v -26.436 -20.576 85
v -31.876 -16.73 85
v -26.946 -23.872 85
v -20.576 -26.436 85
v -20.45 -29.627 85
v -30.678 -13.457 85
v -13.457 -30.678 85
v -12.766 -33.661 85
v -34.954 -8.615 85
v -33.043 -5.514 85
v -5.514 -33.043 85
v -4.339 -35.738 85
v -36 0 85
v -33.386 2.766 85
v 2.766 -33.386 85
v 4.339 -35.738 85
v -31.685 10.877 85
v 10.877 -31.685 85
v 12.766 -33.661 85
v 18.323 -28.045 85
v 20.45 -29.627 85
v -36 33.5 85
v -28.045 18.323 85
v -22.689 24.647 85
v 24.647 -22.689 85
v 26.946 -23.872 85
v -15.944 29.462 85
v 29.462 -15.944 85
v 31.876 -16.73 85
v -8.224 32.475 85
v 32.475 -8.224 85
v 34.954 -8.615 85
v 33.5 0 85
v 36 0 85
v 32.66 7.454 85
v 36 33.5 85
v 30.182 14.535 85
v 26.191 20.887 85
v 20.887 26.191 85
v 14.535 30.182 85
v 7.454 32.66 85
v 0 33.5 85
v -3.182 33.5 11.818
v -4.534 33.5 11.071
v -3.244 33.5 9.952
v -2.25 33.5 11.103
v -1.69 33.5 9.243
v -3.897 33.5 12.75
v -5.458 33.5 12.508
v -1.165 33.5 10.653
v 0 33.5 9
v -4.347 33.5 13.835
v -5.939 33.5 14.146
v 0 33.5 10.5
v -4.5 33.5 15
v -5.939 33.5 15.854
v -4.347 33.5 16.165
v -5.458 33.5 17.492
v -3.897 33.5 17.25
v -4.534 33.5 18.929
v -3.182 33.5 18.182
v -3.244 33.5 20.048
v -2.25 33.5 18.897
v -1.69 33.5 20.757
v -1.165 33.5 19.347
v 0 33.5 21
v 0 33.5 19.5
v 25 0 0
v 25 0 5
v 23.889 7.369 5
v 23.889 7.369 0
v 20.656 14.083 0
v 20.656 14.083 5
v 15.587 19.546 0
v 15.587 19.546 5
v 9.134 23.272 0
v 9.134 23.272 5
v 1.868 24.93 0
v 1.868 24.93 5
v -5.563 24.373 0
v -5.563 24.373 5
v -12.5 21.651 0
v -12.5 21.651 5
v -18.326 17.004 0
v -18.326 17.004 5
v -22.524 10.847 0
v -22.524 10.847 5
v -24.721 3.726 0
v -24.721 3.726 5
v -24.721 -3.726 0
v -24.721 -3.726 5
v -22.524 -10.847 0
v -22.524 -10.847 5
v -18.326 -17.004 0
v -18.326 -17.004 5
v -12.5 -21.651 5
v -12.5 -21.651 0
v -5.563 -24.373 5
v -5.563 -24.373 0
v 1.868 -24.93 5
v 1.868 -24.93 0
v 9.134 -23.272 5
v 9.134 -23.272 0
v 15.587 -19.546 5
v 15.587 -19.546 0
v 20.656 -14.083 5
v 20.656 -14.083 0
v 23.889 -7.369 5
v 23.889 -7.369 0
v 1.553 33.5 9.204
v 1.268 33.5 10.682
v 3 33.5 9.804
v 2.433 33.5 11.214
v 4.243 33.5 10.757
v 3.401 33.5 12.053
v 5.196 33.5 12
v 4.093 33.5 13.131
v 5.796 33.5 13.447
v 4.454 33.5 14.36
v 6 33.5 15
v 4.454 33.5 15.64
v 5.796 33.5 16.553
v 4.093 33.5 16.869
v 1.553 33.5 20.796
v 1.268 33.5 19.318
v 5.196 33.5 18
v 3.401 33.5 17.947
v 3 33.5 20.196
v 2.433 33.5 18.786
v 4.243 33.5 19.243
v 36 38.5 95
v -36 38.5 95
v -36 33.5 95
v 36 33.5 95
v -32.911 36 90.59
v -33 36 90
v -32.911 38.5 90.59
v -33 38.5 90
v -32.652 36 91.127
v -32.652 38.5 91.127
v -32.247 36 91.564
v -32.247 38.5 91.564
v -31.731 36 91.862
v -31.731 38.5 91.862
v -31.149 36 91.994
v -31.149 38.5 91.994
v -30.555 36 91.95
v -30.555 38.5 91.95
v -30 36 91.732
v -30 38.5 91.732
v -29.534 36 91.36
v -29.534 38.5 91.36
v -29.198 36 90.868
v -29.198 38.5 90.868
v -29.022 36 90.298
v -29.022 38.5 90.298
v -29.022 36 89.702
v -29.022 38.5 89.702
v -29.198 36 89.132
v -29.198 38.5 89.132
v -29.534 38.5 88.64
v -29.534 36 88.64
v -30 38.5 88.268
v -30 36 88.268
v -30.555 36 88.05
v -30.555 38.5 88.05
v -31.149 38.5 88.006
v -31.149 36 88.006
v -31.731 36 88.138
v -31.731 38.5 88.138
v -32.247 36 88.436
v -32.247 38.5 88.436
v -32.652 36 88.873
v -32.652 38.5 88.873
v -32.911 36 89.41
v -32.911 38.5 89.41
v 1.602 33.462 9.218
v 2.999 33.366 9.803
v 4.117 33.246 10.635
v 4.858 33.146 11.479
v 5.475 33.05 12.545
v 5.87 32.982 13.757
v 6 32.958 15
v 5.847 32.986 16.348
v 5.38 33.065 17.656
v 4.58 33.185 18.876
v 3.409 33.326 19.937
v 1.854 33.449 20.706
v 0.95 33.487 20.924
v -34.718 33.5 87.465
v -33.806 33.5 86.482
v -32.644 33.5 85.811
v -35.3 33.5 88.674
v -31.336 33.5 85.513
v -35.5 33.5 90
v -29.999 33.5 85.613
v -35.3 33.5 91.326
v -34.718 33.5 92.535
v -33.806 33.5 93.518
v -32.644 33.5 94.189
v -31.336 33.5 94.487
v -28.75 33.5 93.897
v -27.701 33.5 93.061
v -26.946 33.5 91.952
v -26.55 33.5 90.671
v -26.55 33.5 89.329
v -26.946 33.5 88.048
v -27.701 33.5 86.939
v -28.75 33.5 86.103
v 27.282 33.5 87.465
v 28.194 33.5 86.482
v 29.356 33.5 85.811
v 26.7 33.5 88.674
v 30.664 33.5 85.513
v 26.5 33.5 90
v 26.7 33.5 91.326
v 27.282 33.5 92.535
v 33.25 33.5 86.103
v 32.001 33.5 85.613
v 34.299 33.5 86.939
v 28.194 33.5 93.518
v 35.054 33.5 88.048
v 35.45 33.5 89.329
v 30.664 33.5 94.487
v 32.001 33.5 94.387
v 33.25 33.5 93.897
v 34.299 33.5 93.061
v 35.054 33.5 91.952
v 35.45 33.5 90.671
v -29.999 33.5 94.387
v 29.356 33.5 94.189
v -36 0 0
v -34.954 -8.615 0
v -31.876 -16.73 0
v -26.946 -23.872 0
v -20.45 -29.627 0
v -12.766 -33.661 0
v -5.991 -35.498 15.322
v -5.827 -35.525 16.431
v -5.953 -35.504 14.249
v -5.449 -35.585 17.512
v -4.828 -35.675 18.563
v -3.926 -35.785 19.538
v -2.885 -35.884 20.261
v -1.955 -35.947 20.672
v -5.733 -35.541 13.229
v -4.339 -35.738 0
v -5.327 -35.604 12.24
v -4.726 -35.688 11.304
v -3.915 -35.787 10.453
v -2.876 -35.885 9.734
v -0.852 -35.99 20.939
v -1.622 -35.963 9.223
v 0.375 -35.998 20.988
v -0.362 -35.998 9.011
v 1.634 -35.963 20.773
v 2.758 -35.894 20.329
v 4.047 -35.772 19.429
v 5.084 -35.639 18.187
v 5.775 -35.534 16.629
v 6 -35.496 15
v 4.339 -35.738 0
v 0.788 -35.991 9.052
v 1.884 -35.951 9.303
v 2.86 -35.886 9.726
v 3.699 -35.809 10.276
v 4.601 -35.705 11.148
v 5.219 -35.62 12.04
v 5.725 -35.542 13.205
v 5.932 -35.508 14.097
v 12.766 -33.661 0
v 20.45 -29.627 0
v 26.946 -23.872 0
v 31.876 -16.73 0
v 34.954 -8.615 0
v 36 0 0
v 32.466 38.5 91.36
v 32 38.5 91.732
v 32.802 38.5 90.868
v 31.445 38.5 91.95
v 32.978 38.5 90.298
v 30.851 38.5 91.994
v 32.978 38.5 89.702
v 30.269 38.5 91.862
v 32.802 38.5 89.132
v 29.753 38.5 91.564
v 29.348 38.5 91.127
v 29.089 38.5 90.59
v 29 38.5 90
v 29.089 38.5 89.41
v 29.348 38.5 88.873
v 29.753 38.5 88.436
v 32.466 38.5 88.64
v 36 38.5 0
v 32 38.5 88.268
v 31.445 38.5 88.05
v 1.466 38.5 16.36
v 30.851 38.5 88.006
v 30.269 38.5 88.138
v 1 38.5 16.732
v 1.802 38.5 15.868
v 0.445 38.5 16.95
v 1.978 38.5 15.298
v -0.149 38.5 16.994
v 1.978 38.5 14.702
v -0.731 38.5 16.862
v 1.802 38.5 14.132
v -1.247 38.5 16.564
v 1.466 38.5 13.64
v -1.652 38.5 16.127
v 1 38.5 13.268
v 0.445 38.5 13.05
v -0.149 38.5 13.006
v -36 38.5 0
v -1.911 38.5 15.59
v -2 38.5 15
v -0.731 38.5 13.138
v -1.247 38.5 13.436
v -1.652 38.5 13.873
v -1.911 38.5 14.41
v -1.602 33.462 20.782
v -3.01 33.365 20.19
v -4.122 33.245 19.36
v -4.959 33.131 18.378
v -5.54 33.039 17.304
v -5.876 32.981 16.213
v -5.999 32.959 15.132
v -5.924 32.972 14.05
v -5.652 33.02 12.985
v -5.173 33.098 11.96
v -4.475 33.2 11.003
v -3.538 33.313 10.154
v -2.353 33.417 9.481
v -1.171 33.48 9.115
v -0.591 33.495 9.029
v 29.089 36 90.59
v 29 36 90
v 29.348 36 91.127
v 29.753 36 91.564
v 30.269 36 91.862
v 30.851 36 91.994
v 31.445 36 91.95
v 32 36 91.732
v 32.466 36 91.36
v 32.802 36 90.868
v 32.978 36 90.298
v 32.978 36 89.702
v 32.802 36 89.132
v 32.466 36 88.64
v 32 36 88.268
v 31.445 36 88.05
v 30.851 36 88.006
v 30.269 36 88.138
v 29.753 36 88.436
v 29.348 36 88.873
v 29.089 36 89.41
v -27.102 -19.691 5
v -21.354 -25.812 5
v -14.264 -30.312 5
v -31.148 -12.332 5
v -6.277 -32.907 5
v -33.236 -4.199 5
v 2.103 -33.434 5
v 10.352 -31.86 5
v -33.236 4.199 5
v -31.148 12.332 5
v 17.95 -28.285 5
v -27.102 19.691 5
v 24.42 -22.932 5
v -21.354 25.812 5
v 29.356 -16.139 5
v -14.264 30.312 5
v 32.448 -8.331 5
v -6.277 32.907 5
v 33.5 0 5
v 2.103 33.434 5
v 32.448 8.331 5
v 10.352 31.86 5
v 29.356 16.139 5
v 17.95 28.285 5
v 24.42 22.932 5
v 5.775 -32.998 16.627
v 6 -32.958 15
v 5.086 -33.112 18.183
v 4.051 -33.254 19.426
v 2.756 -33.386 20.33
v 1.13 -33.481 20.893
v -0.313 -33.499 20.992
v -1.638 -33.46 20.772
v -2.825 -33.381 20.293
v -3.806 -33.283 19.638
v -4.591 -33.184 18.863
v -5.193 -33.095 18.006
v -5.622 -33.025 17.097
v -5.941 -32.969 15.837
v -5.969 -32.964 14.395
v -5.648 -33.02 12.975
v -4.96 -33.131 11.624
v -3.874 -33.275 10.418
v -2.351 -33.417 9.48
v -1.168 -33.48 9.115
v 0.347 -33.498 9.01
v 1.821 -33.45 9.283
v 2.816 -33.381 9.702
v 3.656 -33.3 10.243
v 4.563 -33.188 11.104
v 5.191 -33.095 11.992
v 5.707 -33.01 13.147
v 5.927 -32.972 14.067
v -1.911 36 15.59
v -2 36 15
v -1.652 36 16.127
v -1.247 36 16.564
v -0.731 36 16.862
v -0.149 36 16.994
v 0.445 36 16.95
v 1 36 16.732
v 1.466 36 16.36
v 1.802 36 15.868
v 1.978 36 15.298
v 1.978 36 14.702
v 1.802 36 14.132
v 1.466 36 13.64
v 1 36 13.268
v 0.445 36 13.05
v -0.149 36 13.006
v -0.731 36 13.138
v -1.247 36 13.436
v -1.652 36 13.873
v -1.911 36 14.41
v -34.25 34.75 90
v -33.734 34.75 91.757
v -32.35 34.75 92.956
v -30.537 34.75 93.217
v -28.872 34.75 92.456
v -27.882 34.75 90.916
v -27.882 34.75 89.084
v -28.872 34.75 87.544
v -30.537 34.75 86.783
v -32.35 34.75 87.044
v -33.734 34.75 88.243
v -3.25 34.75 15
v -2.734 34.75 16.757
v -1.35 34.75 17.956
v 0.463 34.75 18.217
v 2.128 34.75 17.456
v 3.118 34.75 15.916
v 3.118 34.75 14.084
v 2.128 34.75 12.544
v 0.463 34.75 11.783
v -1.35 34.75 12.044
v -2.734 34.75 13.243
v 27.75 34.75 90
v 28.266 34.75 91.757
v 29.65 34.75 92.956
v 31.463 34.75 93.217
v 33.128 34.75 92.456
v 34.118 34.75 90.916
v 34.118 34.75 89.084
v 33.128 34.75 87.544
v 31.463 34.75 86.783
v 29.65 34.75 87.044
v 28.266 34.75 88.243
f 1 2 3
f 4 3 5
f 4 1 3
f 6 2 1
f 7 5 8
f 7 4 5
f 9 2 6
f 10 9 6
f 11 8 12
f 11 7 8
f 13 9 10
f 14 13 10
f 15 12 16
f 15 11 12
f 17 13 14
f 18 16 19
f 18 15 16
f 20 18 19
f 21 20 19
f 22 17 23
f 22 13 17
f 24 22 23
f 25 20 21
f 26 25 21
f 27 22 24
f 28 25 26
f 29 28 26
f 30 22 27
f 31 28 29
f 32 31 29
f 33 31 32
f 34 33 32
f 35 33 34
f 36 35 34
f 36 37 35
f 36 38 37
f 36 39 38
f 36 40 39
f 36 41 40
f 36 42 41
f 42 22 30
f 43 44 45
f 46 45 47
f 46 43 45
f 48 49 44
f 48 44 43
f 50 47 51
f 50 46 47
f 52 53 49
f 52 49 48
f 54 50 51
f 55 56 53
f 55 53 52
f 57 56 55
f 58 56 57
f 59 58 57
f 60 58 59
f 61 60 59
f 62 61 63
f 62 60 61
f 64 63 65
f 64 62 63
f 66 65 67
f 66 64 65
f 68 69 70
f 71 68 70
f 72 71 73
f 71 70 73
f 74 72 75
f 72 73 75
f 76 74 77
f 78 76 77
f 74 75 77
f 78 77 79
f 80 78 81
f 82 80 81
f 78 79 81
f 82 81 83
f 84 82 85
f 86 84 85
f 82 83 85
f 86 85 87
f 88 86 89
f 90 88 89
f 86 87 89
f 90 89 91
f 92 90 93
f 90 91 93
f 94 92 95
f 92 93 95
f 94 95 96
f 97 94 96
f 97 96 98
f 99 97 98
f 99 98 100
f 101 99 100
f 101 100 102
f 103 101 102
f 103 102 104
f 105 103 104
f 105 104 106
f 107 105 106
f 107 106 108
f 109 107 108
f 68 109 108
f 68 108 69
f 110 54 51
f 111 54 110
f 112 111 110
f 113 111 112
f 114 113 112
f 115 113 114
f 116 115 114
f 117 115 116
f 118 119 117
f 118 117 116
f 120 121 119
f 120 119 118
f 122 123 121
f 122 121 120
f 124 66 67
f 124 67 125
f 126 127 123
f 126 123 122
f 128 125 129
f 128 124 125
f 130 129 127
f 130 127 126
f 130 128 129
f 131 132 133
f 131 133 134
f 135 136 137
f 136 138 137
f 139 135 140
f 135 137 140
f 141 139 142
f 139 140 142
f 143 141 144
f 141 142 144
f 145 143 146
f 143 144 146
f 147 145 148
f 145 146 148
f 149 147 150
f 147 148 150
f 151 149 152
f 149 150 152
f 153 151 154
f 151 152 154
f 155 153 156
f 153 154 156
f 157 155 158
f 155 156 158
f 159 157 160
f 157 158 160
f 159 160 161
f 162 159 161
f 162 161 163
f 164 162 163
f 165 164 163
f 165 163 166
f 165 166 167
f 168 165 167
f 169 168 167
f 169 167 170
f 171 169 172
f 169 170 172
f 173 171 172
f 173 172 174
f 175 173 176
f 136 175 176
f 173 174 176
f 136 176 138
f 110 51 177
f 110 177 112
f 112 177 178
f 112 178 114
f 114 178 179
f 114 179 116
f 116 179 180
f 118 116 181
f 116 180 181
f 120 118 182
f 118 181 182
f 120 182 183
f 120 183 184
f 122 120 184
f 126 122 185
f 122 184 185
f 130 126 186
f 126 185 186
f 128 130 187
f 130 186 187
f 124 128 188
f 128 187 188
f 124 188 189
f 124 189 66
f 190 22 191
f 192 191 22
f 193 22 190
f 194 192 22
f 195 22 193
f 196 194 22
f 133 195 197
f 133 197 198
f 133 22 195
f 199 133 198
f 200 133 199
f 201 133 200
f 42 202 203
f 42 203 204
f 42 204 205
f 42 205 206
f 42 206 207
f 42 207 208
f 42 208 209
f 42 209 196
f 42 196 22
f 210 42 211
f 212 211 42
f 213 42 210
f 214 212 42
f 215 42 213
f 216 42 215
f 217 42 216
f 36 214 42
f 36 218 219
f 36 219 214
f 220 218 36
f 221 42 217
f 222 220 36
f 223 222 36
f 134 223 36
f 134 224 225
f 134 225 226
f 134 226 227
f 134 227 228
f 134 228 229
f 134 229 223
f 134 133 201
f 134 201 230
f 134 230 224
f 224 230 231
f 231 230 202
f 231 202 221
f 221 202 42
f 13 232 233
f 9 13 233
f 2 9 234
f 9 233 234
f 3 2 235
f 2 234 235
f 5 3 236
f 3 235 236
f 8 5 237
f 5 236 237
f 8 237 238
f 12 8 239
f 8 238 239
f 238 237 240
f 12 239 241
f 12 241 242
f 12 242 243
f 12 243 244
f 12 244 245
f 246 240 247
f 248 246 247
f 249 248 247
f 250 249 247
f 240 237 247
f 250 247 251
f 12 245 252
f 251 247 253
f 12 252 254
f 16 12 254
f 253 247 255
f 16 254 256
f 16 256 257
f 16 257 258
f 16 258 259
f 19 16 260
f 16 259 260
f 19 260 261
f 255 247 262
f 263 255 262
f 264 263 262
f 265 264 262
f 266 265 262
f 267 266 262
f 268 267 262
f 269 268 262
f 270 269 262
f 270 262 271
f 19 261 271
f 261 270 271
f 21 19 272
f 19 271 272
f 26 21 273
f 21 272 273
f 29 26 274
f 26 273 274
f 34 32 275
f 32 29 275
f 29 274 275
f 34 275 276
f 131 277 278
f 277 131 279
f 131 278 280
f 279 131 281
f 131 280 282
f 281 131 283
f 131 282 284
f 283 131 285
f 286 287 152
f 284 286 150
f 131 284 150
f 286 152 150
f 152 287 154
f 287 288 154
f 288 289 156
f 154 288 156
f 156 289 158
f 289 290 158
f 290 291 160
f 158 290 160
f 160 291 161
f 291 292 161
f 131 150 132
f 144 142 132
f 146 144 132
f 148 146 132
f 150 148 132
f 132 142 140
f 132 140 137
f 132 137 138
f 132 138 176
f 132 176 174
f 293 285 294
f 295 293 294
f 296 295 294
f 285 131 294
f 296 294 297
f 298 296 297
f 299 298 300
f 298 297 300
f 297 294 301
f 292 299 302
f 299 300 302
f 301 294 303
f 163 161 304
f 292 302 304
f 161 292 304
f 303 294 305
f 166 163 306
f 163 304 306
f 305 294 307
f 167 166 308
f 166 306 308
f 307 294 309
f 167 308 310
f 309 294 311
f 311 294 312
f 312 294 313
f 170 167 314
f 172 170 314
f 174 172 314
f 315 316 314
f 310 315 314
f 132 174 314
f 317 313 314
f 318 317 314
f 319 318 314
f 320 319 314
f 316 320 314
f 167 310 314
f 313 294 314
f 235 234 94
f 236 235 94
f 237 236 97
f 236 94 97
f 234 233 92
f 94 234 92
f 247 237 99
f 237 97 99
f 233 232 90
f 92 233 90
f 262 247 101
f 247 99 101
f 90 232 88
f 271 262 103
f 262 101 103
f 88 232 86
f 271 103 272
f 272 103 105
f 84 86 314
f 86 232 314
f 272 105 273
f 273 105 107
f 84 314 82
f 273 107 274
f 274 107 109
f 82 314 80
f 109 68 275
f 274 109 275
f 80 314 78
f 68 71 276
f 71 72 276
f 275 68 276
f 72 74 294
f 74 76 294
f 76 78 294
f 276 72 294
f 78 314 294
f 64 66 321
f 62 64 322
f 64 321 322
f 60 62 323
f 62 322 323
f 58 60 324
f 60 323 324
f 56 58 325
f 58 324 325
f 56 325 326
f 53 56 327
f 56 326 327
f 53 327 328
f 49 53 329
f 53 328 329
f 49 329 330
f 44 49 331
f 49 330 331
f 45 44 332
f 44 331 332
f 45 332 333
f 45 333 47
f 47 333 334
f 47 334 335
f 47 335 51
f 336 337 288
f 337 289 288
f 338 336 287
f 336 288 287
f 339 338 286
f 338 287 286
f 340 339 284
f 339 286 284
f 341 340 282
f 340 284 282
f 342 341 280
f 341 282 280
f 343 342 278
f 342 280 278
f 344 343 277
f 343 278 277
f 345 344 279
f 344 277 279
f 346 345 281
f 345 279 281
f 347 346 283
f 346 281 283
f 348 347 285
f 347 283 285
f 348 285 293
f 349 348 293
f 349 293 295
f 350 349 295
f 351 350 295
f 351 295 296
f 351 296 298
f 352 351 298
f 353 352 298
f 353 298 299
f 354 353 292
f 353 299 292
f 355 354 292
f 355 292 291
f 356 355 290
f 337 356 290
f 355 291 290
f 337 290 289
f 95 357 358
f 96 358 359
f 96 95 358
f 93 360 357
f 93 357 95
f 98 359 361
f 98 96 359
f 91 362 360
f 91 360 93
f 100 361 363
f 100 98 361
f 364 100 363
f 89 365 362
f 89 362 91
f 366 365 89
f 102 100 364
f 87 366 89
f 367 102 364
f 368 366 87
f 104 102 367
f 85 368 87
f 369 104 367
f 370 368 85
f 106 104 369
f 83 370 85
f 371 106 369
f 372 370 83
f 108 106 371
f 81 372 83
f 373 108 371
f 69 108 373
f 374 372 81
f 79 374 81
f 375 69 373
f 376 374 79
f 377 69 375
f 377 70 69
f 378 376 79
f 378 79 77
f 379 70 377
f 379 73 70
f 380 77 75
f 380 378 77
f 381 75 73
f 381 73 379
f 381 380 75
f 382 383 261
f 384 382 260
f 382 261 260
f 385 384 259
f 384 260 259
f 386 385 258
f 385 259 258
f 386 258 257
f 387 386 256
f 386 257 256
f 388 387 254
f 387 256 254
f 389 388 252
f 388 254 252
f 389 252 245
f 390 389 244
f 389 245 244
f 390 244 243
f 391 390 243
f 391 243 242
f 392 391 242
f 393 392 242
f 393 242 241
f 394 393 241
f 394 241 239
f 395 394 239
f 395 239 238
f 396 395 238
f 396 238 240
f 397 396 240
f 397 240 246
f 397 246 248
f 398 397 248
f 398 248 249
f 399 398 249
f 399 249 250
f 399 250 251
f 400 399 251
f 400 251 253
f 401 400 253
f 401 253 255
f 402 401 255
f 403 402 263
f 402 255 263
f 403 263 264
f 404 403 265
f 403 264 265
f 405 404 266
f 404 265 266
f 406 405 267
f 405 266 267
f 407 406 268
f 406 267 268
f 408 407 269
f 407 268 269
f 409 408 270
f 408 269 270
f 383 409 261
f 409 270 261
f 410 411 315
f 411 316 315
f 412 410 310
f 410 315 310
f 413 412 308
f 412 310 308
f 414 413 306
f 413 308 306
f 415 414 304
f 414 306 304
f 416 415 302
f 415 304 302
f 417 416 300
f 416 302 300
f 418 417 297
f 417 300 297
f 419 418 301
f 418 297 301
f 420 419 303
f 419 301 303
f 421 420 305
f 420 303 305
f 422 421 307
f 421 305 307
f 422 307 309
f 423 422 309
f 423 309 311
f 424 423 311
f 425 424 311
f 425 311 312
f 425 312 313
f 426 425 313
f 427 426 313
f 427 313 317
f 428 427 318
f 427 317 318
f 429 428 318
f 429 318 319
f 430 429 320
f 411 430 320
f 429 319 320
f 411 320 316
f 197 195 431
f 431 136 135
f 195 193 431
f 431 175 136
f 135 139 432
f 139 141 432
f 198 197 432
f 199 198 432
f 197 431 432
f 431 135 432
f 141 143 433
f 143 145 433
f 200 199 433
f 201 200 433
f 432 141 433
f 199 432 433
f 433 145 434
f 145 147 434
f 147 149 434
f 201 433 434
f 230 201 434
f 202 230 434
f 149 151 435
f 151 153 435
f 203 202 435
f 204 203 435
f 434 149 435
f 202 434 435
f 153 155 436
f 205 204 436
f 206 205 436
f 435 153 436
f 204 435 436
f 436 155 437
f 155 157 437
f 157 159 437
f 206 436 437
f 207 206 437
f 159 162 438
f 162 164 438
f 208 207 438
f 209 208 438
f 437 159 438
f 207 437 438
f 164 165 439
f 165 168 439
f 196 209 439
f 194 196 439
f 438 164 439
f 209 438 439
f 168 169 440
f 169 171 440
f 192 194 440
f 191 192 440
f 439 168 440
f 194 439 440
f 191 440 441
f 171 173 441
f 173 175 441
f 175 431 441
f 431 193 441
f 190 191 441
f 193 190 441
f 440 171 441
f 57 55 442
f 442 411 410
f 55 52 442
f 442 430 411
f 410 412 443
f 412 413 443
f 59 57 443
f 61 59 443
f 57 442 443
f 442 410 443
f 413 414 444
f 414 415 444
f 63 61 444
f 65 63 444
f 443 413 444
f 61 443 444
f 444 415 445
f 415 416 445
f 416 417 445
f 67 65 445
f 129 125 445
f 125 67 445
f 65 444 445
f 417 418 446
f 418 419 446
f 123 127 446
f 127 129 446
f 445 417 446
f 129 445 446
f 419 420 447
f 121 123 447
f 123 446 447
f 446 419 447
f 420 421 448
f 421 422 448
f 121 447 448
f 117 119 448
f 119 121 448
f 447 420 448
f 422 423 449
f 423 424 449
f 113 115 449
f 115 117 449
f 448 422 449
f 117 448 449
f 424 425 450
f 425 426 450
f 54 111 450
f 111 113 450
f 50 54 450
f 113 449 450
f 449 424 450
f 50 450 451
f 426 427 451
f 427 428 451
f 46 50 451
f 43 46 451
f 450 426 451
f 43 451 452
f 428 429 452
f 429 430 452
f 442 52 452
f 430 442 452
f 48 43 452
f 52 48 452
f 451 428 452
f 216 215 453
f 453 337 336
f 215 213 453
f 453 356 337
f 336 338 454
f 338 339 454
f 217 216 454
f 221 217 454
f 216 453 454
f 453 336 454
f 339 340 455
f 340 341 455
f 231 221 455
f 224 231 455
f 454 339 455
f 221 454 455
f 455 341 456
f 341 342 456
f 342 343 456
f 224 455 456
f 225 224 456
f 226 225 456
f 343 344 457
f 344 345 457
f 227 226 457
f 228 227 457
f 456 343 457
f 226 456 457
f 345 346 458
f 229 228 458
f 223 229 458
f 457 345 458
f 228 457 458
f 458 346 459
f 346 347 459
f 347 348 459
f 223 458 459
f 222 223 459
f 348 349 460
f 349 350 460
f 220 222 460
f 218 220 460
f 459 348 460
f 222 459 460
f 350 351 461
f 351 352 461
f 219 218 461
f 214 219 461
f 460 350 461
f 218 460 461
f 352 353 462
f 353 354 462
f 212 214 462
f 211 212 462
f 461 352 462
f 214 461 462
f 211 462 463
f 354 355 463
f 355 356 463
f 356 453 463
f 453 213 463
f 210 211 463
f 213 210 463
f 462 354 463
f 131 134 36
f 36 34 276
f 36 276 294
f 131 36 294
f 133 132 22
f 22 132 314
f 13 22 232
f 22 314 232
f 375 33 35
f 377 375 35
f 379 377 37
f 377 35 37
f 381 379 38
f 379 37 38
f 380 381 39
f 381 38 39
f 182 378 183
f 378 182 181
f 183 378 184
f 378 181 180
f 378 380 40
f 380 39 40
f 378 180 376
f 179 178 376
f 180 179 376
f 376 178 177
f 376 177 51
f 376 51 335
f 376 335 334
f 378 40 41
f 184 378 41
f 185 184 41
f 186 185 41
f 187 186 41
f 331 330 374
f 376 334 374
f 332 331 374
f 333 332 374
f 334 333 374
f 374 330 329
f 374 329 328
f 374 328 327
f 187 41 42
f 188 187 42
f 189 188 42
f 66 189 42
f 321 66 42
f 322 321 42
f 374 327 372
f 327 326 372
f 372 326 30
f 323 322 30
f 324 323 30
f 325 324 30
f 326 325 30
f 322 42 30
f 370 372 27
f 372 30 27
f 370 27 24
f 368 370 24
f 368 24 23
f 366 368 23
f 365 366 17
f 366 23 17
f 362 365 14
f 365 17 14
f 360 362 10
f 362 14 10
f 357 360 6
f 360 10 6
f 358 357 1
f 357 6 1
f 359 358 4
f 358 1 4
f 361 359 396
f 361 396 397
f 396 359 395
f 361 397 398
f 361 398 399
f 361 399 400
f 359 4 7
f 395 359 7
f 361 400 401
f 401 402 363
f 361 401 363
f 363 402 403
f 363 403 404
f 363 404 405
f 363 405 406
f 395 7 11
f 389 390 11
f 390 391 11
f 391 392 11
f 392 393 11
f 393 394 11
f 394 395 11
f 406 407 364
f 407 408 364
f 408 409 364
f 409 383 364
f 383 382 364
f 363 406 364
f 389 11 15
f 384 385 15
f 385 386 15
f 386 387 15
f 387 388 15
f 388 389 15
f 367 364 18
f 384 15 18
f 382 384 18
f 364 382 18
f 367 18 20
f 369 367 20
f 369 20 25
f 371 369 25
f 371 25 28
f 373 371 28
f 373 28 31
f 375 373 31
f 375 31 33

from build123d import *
from build123d import SkipClean  # not in build123d's __all__

# Parameters (mm, degrees)
F1_DEPTH        = 95
F2_W            = 72
F2_H            = 80
F3_DEPTH        = 10
F4_R            = 33.5
F5_DEPTH        = 80
F7_D            = 4
F7_CSINK_D      = 9
F7_CSINK_ANGLE  = 90
F7_COPIES_COUNT = 2
F7_COPIES_PITCH = 81.154174
F8_R            = 25
F9_DEPTH        = 5.001
F11_R           = 6
F12_DEPTH       = 73.5


# Not quite as in the source:
# - a feature of the source that left no trace in its solid (it failed there, or was rolled back) is left out
# - a pattern or mirror of a feature is missing from the dataset's text; its kind, count and spacing are read off the source's solid


with BuildPart() as f1:
    # F0 (on Top) → F1 (new body)
    with BuildSketch(Plane.XY):
        with BuildLine():
            Line((36, 38.5), (-36, 38.5))
            Line((-36, 38.5), (-36, 0))
            ThreePointArc((-36, 0), (0, -36), (36, 0))
            Line((36, 0), (36, 38.5))
        make_face()
    extrude(amount=F1_DEPTH)

    # F2 (on face) → F3 (cut)
    with BuildSketch(Plane.XY.offset(95)):
        with Locations((0, -6.5)):
            Rectangle(F2_W, F2_H)
    extrude(amount=-F3_DEPTH, mode=Mode.SUBTRACT)

    # F4 (on face) → F5 (cut)
    with BuildSketch(Plane.XY.offset(85)):
        Circle(F4_R)
    extrude(amount=-F5_DEPTH, mode=Mode.SUBTRACT)

    # F7 (through all)
    with Locations(Plane.XZ.offset(-33.5)):
        with Locations((-31, 90), (31, 90)):
            f7 = CounterSinkHole(F7_D / 2, F7_CSINK_D / 2, counter_sink_angle=F7_CSINK_ANGLE)

    # F7_copies: F7 ×2
    with Locations(*[Vector(-0.3819889769, 0, -0.9241668797) * (i * F7_COPIES_PITCH) for i in range(1, F7_COPIES_COUNT)]):
        add(f7, clean=False, mode=Mode.SUBTRACT)

    # F8 (on face) → F9 (cut, through all)
    with BuildSketch(Plane.XY.offset(5)):
        Circle(F8_R)
    extrude(amount=-F9_DEPTH, mode=Mode.SUBTRACT)

    # F11 (on offset) → F12 (cut)
    with BuildSketch(Plane.XZ.offset(40)):
        with Locations((0, 15)):
            Circle(F11_R)
    with SkipClean():  # cleaning this boolean's faces spoils the solid; the shape is the same uncleaned
        extrude(amount=-F12_DEPTH, mode=Mode.SUBTRACT)


solid = f1.part
